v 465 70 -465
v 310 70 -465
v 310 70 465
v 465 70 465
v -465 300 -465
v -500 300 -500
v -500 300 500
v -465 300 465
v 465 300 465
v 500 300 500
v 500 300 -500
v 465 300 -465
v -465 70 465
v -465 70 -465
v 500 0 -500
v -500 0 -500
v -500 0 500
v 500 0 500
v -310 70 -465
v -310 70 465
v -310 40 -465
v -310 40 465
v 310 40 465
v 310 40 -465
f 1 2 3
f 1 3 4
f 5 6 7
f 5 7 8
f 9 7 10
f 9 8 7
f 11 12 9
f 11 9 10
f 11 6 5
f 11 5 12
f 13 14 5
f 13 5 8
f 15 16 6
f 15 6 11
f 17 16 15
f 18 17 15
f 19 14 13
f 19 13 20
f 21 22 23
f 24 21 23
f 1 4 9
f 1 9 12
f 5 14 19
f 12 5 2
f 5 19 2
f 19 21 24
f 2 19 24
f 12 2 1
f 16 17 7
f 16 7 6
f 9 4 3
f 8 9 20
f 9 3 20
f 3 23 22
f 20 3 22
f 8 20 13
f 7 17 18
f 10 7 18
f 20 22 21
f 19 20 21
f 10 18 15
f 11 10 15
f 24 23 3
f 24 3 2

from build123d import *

# Parameters (mm, degrees)
SKETCH1_W           = 1000
SKETCH1_H           = 1000
BOSS_EXTRUDE2_DEPTH = 300
SKETCH1_4_W         = 155
SKETCH1_4_H         = 930
BOSS_EXTRUDE3_DEPTH = 70
SKETCH1_5_W         = 620
SKETCH1_5_H         = 930
BOSS_EXTRUDE4_DEPTH = 40


with BuildPart() as part:
    # Sketch1 → Boss-Extrude2 (new body)
    with BuildSketch(Plane(origin=(0, 0, 0), x_dir=(1, 0, 0), z_dir=(0, 1, 0))):
        Rectangle(SKETCH1_W, SKETCH1_H)
        Polygon((-465, 465), (-310, 465), (310, 465), (465, 465), (465, -465), (310, -465), (-310, -465), (-465, -465), align=None, mode=Mode.SUBTRACT)
    extrude(amount=BOSS_EXTRUDE2_DEPTH)

    # Sketch1<4> → Boss-Extrude3 (add)
    with BuildSketch(Plane(origin=(0, 0, 0), x_dir=(1, 0, 0), z_dir=(0, 1, 0))):
        with Locations((-387.5, 0)):
            Rectangle(SKETCH1_4_W, SKETCH1_4_H)
        with Locations((387.5, 0)):
            Rectangle(SKETCH1_4_W, SKETCH1_4_H)
    extrude(amount=BOSS_EXTRUDE3_DEPTH)

    # Sketch1<5> → Boss-Extrude4 (add)
    with BuildSketch(Plane(origin=(0, 0, 0), x_dir=(1, 0, 0), z_dir=(0, 1, 0))):
        Rectangle(SKETCH1_5_W, SKETCH1_5_H)
    extrude(amount=BOSS_EXTRUDE4_DEPTH)


solid = part.part
